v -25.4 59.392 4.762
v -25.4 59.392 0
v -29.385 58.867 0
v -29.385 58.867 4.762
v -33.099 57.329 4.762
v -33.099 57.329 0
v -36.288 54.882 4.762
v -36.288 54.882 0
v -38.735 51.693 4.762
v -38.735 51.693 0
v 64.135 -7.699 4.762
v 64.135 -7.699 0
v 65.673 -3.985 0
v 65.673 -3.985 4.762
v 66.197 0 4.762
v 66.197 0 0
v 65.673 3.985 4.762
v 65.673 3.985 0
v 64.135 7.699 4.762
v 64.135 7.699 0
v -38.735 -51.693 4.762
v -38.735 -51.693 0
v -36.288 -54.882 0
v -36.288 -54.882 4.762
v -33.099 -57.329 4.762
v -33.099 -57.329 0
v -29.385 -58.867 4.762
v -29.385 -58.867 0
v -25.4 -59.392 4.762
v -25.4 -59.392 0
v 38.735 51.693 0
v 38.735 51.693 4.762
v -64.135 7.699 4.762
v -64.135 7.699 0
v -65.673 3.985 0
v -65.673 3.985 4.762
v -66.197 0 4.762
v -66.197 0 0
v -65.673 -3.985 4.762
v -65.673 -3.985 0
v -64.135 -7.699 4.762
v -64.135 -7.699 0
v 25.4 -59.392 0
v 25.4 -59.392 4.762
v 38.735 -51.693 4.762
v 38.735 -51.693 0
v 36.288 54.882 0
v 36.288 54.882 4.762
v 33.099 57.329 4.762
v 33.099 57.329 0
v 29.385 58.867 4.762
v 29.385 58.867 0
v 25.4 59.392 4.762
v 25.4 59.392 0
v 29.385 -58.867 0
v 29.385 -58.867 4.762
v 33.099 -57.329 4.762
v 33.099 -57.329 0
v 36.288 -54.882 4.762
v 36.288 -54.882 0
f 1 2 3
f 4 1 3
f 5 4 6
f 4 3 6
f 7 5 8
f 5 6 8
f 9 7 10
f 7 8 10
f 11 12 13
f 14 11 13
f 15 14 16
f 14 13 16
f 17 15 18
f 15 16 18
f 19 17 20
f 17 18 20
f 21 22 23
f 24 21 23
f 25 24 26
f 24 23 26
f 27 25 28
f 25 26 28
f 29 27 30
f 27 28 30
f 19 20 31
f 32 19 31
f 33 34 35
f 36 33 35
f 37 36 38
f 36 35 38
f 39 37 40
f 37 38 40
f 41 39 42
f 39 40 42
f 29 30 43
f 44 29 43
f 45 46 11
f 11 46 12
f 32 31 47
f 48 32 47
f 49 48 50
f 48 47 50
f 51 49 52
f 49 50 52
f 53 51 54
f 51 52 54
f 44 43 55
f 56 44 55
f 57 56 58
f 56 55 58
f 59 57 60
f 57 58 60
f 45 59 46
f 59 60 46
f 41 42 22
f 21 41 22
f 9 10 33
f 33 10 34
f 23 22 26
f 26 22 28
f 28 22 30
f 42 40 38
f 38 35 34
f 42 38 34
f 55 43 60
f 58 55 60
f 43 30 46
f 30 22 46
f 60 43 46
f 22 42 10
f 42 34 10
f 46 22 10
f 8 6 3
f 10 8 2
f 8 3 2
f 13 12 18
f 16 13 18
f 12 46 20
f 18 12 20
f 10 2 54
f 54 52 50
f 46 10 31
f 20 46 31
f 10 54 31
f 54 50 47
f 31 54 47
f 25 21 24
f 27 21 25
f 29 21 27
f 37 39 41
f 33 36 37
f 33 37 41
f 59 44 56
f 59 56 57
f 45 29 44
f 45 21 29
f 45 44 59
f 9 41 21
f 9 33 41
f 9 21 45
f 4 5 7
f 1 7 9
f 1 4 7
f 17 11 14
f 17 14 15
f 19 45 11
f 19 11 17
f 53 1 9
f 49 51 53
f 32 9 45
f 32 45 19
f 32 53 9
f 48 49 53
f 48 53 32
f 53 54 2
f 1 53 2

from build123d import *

# Parameters (mm, degrees)
BOSS_EXTRUDE1_DEPTH = 4.7625


with BuildPart() as part:
    # Sketch2 → Boss-Extrude1 (new body)
    with BuildSketch(Plane.XY):
        with BuildLine():
            Line((64.13459107, 7.698729744), (38.73459107, 51.692820256))
            ThreePointArc((38.73459107, 51.692820256), (33.098729744, 57.328681582), (25.4, 59.39155))
            Line((25.4, 59.39155), (-25.4, 59.39155))
            ThreePointArc((-25.4, 59.39155), (-33.098729744, 57.328681582), (-38.73459107, 51.692820256))
            Line((-38.73459107, 51.692820256), (-64.13459107, 7.698729744))
            ThreePointArc((-64.13459107, 7.698729744), (-66.197459488, 0), (-64.13459107, -7.698729744))
            Line((-64.13459107, -7.698729744), (-38.73459107, -51.692820256))
            ThreePointArc((-38.73459107, -51.692820256), (-33.098729744, -57.328681582), (-25.4, -59.39155))
            Line((-25.4, -59.39155), (25.4, -59.39155))
            ThreePointArc((25.4, -59.39155), (33.098729744, -57.328681582), (38.73459107, -51.692820256))
            Line((38.73459107, -51.692820256), (64.13459107, -7.698729744))
            ThreePointArc((64.13459107, -7.698729744), (66.197459488, 0), (64.13459107, 7.698729744))
        make_face()
    extrude(amount=BOSS_EXTRUDE1_DEPTH)


solid = part.part
